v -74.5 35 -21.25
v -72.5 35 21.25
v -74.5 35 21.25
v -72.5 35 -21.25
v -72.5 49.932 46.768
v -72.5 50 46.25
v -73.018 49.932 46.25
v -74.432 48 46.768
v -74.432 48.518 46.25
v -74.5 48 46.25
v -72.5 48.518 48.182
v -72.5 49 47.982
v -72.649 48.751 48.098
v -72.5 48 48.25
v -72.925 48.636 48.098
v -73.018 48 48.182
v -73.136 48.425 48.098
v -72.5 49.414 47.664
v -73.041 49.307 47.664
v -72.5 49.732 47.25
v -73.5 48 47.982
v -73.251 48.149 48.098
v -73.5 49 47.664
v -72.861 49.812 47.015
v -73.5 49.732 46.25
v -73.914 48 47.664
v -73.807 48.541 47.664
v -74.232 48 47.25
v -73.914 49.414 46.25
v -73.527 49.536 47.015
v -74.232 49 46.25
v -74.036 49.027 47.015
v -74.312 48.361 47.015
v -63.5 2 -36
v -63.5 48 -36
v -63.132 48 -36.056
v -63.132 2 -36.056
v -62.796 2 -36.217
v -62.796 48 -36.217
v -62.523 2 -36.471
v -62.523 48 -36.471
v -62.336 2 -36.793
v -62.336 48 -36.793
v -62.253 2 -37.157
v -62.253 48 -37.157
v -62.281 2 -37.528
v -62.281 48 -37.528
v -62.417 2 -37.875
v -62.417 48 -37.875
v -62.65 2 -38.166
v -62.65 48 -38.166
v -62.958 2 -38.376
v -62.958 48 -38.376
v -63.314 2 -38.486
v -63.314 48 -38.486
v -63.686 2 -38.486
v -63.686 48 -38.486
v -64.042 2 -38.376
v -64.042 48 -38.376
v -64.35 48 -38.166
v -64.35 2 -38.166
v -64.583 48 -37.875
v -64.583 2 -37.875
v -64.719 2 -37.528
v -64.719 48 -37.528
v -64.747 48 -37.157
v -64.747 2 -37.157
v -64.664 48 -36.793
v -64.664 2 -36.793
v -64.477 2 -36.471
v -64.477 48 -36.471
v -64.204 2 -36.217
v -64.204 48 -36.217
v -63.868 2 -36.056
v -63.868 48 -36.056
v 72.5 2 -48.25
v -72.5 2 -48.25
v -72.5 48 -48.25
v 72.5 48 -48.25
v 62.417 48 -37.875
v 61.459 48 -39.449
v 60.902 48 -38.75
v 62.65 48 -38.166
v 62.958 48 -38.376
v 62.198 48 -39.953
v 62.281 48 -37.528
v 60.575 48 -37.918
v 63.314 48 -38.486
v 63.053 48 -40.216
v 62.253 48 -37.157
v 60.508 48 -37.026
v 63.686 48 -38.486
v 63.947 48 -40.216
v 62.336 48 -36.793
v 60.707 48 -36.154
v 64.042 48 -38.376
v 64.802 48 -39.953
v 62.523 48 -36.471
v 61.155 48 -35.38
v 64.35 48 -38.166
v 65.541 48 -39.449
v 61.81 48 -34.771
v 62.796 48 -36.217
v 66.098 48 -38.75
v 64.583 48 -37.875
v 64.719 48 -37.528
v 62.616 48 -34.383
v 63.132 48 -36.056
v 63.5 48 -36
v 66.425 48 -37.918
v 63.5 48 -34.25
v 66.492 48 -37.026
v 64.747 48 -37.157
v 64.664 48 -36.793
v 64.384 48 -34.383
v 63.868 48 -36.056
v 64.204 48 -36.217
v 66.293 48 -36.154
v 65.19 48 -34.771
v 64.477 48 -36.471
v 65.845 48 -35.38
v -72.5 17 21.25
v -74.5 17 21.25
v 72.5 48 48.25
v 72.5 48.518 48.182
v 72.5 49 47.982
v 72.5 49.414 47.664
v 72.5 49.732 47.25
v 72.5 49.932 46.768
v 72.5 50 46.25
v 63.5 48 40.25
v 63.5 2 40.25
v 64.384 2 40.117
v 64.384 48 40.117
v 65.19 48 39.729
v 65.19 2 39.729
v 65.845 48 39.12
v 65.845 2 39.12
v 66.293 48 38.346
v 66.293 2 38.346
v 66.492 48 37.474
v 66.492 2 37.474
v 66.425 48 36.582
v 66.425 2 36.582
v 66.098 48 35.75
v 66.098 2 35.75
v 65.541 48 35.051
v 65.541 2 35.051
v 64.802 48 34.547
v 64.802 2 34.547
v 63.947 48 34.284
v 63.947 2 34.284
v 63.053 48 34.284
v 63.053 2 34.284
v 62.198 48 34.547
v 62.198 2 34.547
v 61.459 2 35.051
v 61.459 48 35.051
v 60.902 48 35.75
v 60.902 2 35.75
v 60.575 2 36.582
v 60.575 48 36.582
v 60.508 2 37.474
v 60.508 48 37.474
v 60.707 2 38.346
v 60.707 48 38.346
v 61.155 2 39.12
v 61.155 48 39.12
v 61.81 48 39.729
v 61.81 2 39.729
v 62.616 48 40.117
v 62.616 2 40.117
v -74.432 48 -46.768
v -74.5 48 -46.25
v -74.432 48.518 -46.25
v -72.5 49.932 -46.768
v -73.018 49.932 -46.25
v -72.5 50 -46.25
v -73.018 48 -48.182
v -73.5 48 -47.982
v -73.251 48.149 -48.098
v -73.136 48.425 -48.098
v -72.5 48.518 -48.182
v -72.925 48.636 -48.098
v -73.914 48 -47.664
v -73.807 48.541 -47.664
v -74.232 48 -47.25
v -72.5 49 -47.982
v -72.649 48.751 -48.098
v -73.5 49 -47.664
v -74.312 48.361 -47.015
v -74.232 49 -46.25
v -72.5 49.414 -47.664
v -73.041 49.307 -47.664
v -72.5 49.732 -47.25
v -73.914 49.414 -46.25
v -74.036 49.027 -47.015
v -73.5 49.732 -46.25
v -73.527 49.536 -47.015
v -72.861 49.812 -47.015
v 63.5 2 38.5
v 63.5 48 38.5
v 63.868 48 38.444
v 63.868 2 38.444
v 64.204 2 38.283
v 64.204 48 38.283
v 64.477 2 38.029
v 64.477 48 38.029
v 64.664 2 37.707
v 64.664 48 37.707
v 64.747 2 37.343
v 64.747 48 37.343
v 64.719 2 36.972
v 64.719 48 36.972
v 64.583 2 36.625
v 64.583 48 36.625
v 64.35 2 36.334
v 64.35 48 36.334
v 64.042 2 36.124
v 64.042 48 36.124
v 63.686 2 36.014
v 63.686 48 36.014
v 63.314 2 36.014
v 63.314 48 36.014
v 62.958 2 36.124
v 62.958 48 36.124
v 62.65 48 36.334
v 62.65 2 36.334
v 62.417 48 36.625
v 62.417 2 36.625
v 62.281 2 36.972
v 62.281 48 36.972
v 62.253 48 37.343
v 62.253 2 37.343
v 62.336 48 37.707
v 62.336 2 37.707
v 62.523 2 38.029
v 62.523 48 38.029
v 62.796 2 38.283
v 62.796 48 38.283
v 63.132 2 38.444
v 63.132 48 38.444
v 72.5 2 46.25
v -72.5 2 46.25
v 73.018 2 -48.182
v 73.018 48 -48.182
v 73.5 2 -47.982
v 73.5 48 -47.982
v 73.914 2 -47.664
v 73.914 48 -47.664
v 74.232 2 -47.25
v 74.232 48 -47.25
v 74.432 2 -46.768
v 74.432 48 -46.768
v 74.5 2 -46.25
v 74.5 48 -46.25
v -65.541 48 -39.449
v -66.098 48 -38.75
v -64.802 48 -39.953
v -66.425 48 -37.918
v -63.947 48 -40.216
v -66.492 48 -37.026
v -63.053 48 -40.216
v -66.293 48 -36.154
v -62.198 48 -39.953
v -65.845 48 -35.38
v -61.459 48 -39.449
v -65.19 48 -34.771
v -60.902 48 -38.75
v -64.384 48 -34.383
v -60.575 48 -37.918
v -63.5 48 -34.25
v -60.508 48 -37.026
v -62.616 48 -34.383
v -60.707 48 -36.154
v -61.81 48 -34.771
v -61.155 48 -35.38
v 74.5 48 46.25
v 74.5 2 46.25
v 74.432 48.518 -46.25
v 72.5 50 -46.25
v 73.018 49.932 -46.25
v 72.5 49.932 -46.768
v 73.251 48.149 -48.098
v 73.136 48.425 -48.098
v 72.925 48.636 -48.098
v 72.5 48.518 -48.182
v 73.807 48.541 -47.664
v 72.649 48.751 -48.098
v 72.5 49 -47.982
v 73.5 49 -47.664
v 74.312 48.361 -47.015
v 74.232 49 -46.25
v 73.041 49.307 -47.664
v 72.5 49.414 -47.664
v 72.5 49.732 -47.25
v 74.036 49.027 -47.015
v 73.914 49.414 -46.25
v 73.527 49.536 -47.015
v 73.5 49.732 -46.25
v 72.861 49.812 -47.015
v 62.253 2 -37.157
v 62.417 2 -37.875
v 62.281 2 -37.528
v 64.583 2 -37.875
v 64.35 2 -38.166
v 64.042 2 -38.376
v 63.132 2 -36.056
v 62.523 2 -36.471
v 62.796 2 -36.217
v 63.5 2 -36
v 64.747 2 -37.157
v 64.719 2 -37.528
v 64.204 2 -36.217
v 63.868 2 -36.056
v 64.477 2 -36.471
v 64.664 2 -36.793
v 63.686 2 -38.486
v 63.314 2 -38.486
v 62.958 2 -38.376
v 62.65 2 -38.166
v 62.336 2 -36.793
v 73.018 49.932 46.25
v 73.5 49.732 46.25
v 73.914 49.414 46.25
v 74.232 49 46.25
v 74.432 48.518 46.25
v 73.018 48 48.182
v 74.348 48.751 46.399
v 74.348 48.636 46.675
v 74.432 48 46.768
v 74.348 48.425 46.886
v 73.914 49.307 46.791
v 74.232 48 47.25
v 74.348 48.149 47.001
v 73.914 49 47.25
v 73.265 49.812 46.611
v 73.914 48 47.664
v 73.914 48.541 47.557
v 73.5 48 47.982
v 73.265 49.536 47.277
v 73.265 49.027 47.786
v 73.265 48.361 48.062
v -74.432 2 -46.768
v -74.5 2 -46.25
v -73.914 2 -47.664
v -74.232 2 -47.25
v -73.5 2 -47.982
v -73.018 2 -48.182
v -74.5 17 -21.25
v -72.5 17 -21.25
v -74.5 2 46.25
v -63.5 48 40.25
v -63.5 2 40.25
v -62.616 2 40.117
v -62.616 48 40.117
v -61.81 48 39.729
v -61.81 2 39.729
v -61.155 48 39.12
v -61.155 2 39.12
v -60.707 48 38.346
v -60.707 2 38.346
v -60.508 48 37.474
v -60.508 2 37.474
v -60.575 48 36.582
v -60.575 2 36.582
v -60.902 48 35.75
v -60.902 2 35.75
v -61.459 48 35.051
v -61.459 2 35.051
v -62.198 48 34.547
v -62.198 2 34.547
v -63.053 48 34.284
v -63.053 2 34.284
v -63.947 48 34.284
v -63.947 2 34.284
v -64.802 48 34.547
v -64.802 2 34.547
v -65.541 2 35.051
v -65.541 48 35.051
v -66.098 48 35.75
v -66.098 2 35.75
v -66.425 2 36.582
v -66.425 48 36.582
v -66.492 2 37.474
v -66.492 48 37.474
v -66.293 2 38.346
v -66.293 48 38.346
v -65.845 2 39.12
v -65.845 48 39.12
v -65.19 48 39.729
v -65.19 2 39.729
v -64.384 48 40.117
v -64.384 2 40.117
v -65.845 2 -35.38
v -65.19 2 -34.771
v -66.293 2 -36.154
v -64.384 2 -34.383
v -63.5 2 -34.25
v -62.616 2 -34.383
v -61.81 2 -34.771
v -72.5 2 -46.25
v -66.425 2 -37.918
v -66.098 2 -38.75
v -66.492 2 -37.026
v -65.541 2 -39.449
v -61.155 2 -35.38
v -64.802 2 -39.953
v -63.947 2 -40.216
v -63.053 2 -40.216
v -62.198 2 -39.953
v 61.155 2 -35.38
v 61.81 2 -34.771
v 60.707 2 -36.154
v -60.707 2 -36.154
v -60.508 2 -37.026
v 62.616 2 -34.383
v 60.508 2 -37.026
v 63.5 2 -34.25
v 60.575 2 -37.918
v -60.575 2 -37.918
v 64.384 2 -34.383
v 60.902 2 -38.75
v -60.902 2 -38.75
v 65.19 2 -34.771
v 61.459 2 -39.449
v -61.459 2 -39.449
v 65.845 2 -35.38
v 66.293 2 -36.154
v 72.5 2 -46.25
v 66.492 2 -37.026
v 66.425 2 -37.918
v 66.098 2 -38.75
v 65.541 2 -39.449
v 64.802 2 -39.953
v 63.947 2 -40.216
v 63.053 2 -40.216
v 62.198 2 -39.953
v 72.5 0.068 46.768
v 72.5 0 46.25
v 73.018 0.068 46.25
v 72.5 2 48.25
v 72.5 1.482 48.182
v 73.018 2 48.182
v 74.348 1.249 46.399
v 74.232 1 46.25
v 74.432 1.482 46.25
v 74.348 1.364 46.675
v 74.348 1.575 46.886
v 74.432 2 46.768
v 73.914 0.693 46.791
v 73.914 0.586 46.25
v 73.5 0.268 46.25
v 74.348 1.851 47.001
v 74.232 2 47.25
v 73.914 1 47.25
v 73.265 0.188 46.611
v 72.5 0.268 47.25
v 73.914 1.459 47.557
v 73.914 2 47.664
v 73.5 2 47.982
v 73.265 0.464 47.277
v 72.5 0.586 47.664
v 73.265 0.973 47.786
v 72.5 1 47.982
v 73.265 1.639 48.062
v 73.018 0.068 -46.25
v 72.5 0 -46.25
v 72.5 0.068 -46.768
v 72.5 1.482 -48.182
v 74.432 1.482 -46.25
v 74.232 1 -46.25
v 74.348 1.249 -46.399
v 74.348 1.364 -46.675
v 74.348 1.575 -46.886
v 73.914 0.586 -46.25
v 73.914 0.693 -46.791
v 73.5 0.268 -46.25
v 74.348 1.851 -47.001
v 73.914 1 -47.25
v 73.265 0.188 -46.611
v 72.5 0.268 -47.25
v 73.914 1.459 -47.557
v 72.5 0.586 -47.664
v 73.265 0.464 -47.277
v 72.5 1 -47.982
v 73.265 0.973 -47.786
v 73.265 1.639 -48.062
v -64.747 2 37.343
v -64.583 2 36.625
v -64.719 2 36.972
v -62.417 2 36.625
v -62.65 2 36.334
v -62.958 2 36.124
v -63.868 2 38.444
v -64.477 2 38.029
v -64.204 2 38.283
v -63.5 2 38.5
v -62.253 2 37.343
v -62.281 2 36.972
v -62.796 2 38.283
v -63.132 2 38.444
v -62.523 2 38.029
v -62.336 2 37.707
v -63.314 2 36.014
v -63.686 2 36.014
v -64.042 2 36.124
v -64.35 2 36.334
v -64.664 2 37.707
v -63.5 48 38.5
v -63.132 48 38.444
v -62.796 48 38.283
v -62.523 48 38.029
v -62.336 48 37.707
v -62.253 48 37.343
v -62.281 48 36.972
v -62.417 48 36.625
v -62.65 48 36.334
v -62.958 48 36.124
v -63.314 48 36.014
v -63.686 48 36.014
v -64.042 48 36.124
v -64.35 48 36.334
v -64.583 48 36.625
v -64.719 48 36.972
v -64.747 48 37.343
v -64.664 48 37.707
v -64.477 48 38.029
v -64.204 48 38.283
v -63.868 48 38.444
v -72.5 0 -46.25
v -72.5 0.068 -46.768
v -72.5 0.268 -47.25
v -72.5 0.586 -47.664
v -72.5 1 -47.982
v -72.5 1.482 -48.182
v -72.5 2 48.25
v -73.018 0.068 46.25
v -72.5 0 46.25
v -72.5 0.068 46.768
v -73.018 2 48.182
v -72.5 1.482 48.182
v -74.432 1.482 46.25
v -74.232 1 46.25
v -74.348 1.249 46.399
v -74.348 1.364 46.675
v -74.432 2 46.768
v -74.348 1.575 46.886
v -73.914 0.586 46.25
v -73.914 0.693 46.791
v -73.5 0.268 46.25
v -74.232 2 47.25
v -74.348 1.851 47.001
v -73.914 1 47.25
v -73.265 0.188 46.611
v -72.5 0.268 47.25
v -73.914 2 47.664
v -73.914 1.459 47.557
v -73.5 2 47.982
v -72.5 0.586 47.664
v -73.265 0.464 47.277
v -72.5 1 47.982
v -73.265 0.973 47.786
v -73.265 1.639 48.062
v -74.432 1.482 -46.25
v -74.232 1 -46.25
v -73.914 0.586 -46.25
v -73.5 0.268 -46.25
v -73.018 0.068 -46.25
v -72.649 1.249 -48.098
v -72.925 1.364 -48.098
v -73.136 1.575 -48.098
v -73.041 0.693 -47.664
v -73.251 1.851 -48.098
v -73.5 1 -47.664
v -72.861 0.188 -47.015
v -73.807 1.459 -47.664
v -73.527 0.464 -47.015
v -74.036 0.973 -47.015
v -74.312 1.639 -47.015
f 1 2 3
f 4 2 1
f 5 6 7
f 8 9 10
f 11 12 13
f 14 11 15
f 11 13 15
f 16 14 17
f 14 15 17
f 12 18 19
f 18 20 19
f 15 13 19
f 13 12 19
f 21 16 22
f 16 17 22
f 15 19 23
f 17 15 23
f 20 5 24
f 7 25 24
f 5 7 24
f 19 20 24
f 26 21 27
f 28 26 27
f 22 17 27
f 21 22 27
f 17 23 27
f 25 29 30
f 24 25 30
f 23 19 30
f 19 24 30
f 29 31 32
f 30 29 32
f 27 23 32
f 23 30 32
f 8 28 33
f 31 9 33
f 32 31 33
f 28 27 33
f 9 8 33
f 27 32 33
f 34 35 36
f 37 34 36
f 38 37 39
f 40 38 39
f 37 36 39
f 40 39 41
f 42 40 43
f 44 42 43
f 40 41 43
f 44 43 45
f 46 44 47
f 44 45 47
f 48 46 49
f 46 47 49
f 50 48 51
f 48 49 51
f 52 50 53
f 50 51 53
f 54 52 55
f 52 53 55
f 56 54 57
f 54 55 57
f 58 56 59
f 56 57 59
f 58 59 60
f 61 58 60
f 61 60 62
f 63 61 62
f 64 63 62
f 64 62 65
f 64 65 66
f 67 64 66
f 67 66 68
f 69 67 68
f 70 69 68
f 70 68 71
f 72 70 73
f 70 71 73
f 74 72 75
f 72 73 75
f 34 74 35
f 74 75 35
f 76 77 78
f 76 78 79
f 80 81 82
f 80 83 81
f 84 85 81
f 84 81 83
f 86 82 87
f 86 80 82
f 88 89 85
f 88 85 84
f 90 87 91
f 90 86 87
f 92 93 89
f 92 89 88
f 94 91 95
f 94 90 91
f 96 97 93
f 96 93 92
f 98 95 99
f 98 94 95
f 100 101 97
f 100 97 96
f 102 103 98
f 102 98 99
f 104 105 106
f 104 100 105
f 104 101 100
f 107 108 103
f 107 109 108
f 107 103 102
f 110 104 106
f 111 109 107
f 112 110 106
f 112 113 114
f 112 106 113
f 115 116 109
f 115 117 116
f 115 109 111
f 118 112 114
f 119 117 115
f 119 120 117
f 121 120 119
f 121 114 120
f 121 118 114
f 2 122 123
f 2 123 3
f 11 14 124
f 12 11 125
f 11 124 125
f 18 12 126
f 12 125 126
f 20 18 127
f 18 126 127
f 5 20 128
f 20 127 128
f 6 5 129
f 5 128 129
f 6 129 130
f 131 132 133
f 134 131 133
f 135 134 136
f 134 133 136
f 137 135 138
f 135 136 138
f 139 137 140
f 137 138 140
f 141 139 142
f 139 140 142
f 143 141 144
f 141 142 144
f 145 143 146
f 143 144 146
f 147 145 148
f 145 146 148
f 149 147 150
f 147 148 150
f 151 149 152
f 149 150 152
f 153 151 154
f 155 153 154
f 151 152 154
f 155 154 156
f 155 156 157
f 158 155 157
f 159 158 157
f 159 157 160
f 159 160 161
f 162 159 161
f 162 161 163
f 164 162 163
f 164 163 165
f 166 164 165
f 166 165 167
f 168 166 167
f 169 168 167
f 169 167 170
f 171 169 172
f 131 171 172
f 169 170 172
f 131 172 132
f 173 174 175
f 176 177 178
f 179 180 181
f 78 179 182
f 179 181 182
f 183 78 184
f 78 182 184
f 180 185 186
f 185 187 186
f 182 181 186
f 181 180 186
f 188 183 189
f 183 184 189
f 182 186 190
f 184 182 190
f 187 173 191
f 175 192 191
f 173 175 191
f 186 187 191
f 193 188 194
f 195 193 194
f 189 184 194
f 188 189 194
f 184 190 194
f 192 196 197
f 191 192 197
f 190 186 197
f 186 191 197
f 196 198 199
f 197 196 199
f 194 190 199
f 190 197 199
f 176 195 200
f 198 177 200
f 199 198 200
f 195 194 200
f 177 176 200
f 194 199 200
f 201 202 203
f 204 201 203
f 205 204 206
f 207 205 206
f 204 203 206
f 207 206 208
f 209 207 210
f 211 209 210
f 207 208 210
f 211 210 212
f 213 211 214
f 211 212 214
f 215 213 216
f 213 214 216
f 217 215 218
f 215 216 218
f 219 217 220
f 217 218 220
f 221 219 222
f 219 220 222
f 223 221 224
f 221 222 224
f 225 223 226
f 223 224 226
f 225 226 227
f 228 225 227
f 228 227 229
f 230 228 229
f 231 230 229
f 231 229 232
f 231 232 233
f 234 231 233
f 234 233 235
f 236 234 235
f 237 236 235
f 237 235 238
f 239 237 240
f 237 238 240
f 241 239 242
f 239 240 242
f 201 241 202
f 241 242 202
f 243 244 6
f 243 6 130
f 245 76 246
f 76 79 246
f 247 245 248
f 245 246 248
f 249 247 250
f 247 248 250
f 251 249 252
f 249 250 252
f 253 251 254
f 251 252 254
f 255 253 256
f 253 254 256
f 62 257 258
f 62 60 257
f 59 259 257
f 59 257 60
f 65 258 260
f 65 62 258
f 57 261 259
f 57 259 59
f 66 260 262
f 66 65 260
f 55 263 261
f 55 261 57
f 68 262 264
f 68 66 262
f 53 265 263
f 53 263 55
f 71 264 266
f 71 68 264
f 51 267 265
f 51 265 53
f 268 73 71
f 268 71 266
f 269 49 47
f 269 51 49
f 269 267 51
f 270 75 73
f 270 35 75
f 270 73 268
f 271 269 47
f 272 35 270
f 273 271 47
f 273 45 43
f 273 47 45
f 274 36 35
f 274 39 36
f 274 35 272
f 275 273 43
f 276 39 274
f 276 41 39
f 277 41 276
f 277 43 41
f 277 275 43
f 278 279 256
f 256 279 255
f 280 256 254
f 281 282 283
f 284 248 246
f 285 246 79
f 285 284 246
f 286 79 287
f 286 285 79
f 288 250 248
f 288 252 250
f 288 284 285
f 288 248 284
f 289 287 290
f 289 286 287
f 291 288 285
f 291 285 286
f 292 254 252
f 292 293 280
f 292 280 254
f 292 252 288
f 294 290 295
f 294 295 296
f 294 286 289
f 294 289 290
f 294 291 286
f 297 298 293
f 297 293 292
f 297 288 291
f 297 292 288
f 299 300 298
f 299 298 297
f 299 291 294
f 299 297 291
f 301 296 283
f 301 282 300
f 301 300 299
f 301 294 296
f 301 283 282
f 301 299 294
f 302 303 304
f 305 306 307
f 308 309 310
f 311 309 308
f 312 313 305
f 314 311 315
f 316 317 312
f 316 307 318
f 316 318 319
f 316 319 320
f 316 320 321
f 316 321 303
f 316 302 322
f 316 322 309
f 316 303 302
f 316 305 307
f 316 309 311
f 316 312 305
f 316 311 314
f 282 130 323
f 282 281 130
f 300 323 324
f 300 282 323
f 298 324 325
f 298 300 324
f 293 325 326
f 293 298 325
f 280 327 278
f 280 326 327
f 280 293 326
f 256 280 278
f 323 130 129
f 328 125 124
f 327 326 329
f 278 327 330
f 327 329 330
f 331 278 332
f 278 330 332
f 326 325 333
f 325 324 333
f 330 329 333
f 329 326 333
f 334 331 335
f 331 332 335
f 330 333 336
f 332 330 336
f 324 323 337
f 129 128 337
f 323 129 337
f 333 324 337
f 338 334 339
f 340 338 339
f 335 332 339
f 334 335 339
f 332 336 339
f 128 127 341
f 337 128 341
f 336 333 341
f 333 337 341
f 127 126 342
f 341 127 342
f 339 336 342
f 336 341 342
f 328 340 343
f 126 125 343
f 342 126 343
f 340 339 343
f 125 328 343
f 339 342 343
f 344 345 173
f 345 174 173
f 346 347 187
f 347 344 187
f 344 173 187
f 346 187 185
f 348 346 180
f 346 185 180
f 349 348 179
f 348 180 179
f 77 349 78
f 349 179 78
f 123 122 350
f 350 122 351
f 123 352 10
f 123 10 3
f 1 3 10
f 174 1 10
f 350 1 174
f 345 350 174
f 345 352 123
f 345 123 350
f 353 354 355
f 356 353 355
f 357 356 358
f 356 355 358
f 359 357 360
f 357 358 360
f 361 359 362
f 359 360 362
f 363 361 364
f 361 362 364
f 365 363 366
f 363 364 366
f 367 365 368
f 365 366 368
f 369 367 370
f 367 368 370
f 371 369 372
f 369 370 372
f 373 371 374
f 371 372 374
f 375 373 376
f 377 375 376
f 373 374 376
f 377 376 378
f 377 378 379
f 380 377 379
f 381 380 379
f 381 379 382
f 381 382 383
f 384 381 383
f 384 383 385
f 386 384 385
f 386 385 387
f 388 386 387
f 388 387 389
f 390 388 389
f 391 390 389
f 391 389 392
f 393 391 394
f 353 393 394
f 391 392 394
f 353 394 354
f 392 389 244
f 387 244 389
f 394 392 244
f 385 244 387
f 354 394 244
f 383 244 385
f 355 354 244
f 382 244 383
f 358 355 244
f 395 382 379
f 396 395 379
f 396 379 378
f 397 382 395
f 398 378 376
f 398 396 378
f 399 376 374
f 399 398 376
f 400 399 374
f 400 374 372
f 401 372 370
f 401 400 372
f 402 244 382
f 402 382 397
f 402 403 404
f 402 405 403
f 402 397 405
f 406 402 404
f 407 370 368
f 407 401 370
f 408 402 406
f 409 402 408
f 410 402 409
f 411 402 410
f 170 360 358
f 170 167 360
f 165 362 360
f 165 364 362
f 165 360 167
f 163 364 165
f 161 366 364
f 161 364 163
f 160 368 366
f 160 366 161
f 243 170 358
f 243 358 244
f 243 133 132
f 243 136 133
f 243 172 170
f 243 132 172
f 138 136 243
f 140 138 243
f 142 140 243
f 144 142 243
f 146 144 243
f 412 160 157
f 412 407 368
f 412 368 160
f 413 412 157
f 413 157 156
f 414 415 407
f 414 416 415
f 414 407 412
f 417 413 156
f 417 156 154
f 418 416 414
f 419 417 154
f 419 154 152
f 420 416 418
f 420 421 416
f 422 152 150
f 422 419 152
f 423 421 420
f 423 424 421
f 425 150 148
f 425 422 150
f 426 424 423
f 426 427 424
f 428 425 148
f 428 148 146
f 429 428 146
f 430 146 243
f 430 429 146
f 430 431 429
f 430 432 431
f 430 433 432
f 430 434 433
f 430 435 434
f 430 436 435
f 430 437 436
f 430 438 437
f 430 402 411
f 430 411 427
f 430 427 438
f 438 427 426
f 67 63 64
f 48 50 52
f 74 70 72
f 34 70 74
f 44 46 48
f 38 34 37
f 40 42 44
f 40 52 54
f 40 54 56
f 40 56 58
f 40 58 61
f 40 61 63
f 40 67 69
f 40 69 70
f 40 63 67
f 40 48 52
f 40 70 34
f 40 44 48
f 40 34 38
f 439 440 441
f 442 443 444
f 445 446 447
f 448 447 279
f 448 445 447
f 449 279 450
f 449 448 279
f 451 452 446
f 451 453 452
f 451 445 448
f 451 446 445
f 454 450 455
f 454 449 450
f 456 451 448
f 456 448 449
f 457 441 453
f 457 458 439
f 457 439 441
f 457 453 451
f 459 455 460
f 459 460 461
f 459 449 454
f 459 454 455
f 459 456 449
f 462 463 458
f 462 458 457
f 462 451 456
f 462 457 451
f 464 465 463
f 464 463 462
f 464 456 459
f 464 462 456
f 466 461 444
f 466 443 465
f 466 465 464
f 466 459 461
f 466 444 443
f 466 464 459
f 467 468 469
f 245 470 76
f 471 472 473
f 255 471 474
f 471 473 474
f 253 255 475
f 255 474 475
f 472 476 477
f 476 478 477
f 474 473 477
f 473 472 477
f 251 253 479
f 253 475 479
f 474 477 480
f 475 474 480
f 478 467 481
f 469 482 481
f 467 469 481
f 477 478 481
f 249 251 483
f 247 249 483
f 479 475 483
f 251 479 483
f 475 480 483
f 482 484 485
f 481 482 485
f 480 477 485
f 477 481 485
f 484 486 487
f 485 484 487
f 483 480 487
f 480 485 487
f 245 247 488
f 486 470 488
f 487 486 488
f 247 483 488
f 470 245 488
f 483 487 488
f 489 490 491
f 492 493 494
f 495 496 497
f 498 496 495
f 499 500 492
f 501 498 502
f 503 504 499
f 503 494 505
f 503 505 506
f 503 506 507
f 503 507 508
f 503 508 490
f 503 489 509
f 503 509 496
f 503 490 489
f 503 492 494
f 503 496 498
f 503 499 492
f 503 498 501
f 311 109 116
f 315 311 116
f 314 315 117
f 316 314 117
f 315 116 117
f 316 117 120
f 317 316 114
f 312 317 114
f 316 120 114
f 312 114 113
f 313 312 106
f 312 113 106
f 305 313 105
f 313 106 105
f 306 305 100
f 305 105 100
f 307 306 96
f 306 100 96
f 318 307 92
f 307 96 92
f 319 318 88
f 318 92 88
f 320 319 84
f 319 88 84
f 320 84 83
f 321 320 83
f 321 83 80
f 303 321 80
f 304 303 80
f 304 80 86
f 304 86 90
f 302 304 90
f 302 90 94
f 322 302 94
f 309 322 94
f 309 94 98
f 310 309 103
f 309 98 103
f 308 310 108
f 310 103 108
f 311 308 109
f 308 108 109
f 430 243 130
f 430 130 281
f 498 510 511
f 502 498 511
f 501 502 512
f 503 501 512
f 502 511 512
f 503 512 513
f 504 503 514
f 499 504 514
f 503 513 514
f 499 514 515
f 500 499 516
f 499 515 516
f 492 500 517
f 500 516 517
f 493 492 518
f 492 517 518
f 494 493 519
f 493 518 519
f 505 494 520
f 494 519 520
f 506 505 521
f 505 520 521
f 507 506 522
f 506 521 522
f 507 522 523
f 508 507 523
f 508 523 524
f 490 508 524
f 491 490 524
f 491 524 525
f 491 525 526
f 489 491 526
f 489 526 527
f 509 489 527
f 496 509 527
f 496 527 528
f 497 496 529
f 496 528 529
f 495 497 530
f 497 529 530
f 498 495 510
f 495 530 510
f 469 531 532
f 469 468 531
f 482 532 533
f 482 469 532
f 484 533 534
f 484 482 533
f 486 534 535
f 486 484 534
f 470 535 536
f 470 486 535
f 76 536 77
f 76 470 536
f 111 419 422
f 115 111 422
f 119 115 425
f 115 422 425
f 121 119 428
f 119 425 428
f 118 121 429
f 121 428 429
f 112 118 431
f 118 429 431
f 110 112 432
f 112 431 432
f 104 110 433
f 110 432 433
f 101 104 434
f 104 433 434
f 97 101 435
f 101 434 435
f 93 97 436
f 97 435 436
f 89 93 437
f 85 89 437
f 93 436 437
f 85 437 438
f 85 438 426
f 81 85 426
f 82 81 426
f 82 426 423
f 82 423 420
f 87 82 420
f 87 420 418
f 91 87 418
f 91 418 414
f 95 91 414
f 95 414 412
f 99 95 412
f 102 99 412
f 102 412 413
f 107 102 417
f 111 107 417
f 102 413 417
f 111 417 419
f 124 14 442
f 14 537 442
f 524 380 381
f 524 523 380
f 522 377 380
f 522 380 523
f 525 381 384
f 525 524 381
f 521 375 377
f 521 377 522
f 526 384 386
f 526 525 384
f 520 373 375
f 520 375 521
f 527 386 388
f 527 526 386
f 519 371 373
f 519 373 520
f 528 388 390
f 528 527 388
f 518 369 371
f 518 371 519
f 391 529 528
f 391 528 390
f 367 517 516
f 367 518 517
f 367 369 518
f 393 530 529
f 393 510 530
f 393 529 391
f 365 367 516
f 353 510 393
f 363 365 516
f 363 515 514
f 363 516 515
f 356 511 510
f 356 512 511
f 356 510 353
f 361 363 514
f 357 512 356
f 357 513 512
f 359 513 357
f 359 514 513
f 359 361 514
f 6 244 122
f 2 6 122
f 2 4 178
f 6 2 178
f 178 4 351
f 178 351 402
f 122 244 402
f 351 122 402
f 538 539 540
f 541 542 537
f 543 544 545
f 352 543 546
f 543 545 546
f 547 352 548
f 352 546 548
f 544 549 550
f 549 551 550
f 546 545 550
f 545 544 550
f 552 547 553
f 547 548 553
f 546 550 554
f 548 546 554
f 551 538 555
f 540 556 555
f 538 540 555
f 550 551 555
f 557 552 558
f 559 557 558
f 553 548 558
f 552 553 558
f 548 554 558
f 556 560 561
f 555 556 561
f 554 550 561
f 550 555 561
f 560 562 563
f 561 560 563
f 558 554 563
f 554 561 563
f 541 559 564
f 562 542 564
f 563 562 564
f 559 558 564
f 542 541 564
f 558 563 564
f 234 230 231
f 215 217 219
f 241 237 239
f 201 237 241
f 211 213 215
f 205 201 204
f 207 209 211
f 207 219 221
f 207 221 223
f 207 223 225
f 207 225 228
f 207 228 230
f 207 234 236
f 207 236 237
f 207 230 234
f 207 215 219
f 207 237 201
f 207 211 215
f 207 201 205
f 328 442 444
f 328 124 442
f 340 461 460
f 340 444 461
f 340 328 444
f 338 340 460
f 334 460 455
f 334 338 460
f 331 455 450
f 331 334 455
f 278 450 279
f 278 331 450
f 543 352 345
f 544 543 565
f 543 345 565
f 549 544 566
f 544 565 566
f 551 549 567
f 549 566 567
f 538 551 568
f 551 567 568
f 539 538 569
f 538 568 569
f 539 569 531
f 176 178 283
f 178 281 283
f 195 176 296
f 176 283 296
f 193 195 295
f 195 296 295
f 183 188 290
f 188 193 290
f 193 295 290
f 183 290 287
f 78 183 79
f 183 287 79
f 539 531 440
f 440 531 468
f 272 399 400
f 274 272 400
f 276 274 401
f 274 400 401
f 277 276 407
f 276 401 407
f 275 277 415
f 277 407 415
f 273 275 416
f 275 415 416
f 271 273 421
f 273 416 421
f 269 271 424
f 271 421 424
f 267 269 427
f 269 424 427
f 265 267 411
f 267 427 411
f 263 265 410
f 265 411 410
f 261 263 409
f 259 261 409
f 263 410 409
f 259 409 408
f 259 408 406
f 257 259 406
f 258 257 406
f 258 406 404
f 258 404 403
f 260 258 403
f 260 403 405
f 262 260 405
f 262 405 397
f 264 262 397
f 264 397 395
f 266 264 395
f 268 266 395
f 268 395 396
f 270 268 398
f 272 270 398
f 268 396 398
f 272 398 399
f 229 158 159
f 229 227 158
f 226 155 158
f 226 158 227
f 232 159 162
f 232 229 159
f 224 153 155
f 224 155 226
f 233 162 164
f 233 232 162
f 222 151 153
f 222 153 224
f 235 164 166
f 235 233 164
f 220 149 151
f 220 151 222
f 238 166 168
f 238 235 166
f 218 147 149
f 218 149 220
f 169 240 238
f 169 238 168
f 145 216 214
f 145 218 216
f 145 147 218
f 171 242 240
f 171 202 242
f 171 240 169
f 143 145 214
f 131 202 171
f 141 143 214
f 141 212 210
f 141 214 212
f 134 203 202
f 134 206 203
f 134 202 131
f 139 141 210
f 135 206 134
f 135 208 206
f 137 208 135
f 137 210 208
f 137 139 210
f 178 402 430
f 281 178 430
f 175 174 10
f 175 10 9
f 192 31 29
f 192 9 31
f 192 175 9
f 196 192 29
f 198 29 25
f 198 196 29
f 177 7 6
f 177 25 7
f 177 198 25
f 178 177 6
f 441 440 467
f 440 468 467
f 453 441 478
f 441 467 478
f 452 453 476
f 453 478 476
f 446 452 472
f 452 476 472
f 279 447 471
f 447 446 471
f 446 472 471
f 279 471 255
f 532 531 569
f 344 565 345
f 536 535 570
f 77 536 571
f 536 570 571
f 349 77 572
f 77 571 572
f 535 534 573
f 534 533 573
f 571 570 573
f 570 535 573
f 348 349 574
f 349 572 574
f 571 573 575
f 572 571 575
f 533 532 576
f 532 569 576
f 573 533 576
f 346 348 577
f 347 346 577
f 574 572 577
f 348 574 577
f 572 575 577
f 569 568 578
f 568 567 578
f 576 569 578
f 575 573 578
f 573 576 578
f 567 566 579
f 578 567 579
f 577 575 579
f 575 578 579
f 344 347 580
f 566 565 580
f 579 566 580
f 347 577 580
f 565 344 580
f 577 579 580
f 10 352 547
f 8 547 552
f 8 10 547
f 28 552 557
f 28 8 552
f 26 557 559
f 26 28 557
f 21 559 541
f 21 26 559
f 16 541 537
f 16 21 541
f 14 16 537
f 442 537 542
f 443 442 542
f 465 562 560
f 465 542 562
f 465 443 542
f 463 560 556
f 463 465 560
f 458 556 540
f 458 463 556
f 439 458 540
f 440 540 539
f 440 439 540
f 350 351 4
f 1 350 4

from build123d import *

# Parameters (mm, degrees)
SKETCH1_W           = 149
SKETCH1_H           = 96.5
BOSS_EXTRUDE1_DEPTH = 50
SHELL2_T            = -2
SKETCH2_R           = 3
BOSS_EXTRUDE2_DEPTH = 46
SKETCH3_W           = 42.5
SKETCH3_H           = 18
CUT_EXTRUDE1_DEPTH  = 46
SKETCH4_R           = 1.25
CUT_EXTRUDE2_DEPTH  = 46
FILLET1_R           = 2


with BuildPart() as part:
    # Sketch1 → Boss-Extrude1 (new body)
    with BuildSketch(Plane(origin=(0, 0, 0), x_dir=(1, 0, 0), z_dir=(0, 1, 0))):
        Rectangle(SKETCH1_W, SKETCH1_H)
    extrude(amount=BOSS_EXTRUDE1_DEPTH)

    # Shell2
    shell2_openings = [part.faces().sort_by_distance(p)[0] for p in [
        (0, 50, 0),
    ]]
    offset(amount=SHELL2_T, openings=shell2_openings, kind=Kind.INTERSECTION)

    # Sketch2 → Boss-Extrude2 (add)
    with BuildSketch(Plane(origin=(0, 2, 0), x_dir=(1, 0, 0), z_dir=(0, 1, 0))):
        with Locations(Location((-63.5, 37.25, 0), (0, 0, 270))):
            Circle(SKETCH2_R)
        with Locations(Location((63.5, 37.25, 0), (0, 0, 270))):
            Circle(SKETCH2_R)
        with Locations(Location((63.5, -37.25, 0), (0, 0, 270))):
            Circle(SKETCH2_R)
        with Locations(Location((-63.5, -37.25, 0), (0, 0, 270))):
            Circle(SKETCH2_R)
    extrude(amount=BOSS_EXTRUDE2_DEPTH)

    # Sketch3 → Cut-Extrude1 (cut)
    with BuildSketch(Plane(origin=(-72.5, 0, 0), x_dir=(0, 0, -1), z_dir=(1, 0, 0))):
        with Locations((0, 26)):
            Rectangle(SKETCH3_W, SKETCH3_H)
    extrude(amount=-CUT_EXTRUDE1_DEPTH, mode=Mode.SUBTRACT)

    # Sketch4 → Cut-Extrude2 (cut)
    with BuildSketch(Plane(origin=(0, 48, 0), x_dir=(1, 0, 0), z_dir=(0, 1, 0))):
        with Locations(Location((63.5, -37.25, 0), (0, 0, 270))):
            Circle(SKETCH4_R)
        with Locations(Location((-63.5, 37.25, 0), (0, 0, 270))):
            Circle(SKETCH4_R)
        with Locations(Location((-63.5, -37.25, 0), (0, 0, 270))):
            Circle(SKETCH4_R)
        with Locations(Location((63.5, 37.25, 0), (0, 0, 270))):
            Circle(SKETCH4_R)
    extrude(amount=-CUT_EXTRUDE2_DEPTH, mode=Mode.SUBTRACT)

    # Fillet1
    fillet1_edges = [part.edges().sort_by_distance(p)[0] for p in [
        (-74.5, 50, 0),
        (0, 50, 48.25),
        (74.5, 50, 0),
        (0, 0, 48.25),
        (-74.5, 0, 0),
        (0, 0, -48.25),
        (74.5, 0, 0),
        (74.5, 25, 48.25),
        (-74.5, 25, 48.25),
        (-74.5, 25, -48.25),
        (74.5, 25, -48.25),
        (0, 50, -48.25),
    ]]
    fillet(fillet1_edges, radius=FILLET1_R - 0.0001)  # a hair under: the kernel refuses the full size


solid = part.part
